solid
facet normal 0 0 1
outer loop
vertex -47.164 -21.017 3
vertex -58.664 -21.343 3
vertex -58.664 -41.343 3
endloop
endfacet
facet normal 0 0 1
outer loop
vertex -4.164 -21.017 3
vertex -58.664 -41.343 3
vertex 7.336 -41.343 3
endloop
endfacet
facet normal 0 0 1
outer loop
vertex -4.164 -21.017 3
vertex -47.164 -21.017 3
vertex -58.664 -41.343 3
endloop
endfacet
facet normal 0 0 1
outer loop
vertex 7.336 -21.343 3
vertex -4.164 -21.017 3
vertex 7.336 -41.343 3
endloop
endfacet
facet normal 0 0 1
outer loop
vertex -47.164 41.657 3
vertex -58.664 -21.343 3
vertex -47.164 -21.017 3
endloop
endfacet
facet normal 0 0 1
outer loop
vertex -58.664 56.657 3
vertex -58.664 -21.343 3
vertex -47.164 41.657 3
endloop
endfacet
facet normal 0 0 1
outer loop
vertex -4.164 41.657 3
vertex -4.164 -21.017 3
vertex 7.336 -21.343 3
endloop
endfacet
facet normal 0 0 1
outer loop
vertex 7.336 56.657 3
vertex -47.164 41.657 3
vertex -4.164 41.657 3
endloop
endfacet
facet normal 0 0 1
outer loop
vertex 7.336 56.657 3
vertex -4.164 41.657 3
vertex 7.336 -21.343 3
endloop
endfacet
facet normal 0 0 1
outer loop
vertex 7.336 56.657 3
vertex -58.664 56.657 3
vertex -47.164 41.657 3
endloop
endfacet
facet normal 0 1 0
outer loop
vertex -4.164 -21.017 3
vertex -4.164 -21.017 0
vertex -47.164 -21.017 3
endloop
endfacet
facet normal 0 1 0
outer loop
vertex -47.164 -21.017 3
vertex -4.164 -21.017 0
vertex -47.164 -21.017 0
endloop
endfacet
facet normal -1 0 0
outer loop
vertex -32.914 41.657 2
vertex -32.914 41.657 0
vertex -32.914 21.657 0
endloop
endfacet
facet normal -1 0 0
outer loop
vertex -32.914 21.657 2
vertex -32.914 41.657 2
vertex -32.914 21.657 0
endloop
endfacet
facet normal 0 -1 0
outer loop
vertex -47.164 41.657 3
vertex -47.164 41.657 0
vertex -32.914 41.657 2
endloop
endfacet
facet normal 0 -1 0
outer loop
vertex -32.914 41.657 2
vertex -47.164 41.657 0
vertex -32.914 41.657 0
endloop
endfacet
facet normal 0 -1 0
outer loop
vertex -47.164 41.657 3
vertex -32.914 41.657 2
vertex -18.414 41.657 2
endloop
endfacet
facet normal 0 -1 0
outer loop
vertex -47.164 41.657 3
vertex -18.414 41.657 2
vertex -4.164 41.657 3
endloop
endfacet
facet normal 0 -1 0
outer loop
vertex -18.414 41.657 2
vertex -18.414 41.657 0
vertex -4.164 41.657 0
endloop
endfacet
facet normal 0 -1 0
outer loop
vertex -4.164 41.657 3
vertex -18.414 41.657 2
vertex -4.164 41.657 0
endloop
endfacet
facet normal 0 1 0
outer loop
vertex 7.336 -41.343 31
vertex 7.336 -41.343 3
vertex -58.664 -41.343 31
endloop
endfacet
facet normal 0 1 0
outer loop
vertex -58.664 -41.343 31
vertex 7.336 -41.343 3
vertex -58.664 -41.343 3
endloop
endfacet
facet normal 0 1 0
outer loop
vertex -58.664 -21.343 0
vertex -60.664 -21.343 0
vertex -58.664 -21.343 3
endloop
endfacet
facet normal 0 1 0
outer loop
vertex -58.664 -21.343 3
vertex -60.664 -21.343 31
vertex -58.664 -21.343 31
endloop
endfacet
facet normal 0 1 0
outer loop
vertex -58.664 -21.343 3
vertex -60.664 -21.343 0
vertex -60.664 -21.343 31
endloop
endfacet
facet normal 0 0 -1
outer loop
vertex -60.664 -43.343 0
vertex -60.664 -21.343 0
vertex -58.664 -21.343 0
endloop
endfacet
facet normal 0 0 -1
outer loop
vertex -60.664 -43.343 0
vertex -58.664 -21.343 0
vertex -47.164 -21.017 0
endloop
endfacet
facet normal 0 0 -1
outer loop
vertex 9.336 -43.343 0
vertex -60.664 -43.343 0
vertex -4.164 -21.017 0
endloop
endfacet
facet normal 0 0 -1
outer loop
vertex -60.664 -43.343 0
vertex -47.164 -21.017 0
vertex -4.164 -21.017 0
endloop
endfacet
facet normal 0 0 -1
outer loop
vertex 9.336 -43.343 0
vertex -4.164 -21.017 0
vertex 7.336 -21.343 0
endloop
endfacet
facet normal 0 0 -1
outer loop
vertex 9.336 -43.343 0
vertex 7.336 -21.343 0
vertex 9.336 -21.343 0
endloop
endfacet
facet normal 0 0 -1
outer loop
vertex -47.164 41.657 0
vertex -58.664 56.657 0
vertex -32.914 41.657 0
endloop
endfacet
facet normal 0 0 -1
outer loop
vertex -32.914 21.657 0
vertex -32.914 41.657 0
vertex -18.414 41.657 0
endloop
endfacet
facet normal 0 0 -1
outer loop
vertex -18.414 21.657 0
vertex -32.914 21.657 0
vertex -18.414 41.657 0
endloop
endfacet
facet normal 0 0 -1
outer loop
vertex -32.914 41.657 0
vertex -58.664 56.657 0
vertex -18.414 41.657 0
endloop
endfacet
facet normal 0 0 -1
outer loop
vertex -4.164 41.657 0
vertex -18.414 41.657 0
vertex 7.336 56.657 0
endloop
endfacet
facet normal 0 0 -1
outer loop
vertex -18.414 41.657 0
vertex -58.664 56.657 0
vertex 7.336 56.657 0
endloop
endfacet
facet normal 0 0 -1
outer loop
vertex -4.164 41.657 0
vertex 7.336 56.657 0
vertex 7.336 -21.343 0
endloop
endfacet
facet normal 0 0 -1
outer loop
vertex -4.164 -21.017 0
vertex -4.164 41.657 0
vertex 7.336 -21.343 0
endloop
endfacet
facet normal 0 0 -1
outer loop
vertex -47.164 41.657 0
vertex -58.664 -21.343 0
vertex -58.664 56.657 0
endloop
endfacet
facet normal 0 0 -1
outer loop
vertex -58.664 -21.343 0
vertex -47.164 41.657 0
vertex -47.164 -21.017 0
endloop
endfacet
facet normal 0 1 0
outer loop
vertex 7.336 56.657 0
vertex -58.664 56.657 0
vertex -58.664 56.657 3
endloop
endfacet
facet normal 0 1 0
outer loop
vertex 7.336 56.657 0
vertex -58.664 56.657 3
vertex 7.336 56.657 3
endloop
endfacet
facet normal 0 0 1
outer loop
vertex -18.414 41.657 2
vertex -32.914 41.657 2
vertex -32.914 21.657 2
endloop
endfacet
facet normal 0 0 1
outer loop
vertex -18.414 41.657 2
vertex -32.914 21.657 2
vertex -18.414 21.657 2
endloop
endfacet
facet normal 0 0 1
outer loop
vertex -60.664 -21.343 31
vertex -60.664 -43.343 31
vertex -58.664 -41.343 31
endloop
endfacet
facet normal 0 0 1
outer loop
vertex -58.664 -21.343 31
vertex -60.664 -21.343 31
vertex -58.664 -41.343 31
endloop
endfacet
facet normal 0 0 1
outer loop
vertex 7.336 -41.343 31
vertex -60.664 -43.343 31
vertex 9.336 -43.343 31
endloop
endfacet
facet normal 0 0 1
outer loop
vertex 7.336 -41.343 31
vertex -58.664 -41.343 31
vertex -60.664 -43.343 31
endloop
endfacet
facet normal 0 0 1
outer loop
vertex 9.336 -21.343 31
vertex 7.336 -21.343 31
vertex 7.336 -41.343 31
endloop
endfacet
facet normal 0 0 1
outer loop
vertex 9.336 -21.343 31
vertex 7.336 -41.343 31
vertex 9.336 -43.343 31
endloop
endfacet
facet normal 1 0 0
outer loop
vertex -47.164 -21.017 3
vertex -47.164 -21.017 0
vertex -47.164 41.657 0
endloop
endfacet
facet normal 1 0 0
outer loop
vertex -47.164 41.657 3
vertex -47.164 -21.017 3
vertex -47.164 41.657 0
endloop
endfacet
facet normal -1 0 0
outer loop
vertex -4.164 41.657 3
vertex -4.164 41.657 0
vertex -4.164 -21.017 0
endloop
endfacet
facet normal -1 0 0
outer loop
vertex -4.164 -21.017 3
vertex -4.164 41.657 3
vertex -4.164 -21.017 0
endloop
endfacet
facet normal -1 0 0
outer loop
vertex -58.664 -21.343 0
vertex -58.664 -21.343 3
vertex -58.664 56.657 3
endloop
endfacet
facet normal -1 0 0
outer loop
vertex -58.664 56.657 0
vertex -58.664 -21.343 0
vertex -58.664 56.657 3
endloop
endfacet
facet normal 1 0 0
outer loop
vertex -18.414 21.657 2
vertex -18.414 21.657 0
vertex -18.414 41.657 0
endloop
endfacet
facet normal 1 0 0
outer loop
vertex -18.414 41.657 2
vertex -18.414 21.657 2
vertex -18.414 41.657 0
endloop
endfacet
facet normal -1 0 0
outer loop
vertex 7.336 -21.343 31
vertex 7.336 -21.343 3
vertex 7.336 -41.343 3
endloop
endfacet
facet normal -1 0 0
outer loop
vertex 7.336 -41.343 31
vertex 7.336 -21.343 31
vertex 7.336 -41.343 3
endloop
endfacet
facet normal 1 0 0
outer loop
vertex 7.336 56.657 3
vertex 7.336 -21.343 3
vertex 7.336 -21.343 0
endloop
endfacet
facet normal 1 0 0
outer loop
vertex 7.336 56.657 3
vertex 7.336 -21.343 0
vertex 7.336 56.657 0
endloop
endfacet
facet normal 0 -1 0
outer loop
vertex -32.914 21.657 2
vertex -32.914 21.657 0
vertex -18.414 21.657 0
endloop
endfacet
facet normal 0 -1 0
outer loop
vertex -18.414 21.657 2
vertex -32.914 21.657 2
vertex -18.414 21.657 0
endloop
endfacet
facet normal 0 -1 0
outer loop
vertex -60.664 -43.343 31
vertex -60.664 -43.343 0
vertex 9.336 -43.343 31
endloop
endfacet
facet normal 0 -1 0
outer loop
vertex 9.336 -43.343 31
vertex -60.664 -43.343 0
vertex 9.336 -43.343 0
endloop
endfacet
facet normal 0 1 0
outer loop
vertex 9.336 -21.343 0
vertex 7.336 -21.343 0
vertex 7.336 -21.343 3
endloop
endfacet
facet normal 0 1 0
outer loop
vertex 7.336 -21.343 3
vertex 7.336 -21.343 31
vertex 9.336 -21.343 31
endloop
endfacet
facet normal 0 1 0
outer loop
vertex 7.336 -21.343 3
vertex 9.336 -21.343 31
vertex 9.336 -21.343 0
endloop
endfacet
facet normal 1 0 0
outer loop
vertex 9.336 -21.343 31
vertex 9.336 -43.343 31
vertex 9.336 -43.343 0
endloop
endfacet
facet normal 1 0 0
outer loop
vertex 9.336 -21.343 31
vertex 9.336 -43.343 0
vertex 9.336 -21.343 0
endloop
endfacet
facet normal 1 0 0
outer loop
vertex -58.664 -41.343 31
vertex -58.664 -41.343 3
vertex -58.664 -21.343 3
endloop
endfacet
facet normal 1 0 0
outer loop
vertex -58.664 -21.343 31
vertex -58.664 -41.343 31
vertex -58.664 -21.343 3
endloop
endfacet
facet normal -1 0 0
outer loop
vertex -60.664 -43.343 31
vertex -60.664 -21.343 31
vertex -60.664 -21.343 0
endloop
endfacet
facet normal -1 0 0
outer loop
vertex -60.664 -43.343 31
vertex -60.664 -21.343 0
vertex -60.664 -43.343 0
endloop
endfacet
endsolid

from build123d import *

# Parameters (mm, degrees)
F0_W     = 70
F0_H     = 100
F1_DEPTH = 3
F3_DEPTH = 28
F4_W     = 2
F4_H     = 78
F5_DEPTH = 30.6
F7_DEPTH = 25
F8_W     = 14.5
F8_H     = 20
F9_DEPTH = 1


with BuildPart() as f1:
    # F0 (on Top) → F1 (new body)
    with BuildSketch(Plane.XY):
        with Locations((-25.664028, 6.657216)):
            Rectangle(F0_W, F0_H)
    extrude(amount=F1_DEPTH)

    # F2 (on face) → F3 (join)
    with BuildSketch(Plane.XY.offset(3)):
        Polygon((-60.664028, -21.342784), (-60.664028, -43.342784), (9.335972, -43.342784), (9.335972, -21.342784), (7.335972, -21.342784), (7.335972, -41.342784), (-58.664028, -41.342784), (-58.664028, -21.342784), align=None)
    extrude(amount=F3_DEPTH)

    # F4 (on face) → F5 (cut)
    with BuildSketch(Plane.XY.offset(3)):
        with Locations((8.335972, 17.657216)):
            Rectangle(F4_W, F4_H)
        with Locations((-59.664028, 17.657216)):
            Rectangle(F4_W, F4_H)
    extrude(amount=-F5_DEPTH, mode=Mode.SUBTRACT)

    # F6 (on face) → F7 (cut)
    with BuildSketch(Plane(origin=(0, 0, 0), x_dir=(1, 0, 0), z_dir=(0, 0, -1))):
        Polygon((-4.164028, 21.016594), (-47.164028, 21.016594), (-47.164028, -41.657216), (-32.914028, -41.657216), (-32.914028, -21.657216), (-25.664028, -21.657216), (-18.414028, -21.657216), (-18.414028, -41.657216), (-4.164028, -41.657216), align=None)
    extrude(amount=-F7_DEPTH, mode=Mode.SUBTRACT)

    # F8 (on face) → F9 (cut)
    with BuildSketch(Plane.XY.offset(3)):
        with Locations((-25.664028, 31.657216)):
            Rectangle(F8_W, F8_H)
    extrude(amount=-F9_DEPTH, mode=Mode.SUBTRACT)


solid = f1.part
